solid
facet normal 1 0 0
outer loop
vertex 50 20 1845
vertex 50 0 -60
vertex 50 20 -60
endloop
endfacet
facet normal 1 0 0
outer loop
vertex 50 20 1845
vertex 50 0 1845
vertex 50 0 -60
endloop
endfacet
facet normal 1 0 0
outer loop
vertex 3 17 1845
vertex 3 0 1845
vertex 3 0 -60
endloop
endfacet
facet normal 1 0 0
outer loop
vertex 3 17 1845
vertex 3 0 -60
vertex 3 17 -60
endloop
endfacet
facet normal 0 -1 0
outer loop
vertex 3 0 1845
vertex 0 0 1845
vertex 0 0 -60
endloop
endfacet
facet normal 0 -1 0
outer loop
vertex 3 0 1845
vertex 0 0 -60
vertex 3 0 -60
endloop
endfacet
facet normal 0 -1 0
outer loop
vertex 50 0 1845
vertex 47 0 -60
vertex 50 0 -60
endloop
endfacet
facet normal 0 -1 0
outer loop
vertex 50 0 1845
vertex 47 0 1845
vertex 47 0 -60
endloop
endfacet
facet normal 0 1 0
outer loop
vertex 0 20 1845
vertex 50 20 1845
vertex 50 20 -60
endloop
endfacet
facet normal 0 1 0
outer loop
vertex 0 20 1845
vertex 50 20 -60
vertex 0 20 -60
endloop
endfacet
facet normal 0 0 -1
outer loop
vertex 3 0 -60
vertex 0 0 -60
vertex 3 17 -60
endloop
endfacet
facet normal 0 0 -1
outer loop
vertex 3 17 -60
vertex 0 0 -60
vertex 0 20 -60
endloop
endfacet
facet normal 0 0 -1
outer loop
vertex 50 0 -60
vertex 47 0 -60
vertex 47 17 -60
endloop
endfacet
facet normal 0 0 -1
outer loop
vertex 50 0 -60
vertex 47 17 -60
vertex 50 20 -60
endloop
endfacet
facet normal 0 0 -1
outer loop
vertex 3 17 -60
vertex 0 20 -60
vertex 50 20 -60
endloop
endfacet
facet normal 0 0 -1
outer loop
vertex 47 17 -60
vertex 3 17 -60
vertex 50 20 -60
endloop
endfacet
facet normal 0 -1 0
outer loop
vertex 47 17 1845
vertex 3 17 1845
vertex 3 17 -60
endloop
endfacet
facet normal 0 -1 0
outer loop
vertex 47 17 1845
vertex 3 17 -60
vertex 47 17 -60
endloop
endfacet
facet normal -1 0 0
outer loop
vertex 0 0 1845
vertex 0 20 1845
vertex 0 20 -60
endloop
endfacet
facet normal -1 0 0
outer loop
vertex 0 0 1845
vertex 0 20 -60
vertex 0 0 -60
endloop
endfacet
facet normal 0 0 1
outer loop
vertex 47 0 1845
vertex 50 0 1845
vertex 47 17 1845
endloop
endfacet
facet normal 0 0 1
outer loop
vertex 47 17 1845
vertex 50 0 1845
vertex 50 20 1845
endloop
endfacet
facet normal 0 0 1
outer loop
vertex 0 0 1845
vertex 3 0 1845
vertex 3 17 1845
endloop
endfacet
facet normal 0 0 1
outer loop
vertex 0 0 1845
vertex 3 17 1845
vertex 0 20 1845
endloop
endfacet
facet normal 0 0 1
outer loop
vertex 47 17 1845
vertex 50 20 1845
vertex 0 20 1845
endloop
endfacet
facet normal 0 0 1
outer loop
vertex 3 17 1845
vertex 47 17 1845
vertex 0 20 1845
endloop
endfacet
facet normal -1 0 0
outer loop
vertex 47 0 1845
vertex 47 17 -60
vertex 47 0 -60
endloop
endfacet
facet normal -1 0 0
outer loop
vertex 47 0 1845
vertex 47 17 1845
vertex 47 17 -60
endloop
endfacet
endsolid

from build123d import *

# Parameters (mm, degrees)
BOSS_EXTRUDE1_DEPTH = 1785
EXTRUDE_R_DEPTH     = 60
EXTRUDE_L_DEPTH     = 60


with BuildPart() as part:
    # Sketch1 → Boss-Extrude1 (new body)
    with BuildSketch(Plane.XY):
        Polygon((0, 0), (0, 20), (50, 20), (50, 0), (47, 0), (47, 17), (3, 17), (3, 0), align=None)
    extrude(amount=BOSS_EXTRUDE1_DEPTH)

    # Sketch2 → Extrude R (add)
    with BuildSketch(Plane.XY.offset(1785)):
        Polygon((0, 0), (0, 20), (50, 20), (50, 0), (47, 0), (47, 17), (3, 17), (3, 0), align=None)
    extrude(amount=EXTRUDE_R_DEPTH)

    # Sketch3 → Extrude L (add)
    with BuildSketch(Plane(origin=(0, 0, 0), x_dir=(-1, 0, 0), z_dir=(0, 0, -1))):
        Polygon((-50, 0), (-50, 20), (0, 20), (0, 0), (-3, 0), (-3, 17), (-47, 17), (-47, 0), align=None)
    extrude(amount=EXTRUDE_L_DEPTH)


solid = part.part
